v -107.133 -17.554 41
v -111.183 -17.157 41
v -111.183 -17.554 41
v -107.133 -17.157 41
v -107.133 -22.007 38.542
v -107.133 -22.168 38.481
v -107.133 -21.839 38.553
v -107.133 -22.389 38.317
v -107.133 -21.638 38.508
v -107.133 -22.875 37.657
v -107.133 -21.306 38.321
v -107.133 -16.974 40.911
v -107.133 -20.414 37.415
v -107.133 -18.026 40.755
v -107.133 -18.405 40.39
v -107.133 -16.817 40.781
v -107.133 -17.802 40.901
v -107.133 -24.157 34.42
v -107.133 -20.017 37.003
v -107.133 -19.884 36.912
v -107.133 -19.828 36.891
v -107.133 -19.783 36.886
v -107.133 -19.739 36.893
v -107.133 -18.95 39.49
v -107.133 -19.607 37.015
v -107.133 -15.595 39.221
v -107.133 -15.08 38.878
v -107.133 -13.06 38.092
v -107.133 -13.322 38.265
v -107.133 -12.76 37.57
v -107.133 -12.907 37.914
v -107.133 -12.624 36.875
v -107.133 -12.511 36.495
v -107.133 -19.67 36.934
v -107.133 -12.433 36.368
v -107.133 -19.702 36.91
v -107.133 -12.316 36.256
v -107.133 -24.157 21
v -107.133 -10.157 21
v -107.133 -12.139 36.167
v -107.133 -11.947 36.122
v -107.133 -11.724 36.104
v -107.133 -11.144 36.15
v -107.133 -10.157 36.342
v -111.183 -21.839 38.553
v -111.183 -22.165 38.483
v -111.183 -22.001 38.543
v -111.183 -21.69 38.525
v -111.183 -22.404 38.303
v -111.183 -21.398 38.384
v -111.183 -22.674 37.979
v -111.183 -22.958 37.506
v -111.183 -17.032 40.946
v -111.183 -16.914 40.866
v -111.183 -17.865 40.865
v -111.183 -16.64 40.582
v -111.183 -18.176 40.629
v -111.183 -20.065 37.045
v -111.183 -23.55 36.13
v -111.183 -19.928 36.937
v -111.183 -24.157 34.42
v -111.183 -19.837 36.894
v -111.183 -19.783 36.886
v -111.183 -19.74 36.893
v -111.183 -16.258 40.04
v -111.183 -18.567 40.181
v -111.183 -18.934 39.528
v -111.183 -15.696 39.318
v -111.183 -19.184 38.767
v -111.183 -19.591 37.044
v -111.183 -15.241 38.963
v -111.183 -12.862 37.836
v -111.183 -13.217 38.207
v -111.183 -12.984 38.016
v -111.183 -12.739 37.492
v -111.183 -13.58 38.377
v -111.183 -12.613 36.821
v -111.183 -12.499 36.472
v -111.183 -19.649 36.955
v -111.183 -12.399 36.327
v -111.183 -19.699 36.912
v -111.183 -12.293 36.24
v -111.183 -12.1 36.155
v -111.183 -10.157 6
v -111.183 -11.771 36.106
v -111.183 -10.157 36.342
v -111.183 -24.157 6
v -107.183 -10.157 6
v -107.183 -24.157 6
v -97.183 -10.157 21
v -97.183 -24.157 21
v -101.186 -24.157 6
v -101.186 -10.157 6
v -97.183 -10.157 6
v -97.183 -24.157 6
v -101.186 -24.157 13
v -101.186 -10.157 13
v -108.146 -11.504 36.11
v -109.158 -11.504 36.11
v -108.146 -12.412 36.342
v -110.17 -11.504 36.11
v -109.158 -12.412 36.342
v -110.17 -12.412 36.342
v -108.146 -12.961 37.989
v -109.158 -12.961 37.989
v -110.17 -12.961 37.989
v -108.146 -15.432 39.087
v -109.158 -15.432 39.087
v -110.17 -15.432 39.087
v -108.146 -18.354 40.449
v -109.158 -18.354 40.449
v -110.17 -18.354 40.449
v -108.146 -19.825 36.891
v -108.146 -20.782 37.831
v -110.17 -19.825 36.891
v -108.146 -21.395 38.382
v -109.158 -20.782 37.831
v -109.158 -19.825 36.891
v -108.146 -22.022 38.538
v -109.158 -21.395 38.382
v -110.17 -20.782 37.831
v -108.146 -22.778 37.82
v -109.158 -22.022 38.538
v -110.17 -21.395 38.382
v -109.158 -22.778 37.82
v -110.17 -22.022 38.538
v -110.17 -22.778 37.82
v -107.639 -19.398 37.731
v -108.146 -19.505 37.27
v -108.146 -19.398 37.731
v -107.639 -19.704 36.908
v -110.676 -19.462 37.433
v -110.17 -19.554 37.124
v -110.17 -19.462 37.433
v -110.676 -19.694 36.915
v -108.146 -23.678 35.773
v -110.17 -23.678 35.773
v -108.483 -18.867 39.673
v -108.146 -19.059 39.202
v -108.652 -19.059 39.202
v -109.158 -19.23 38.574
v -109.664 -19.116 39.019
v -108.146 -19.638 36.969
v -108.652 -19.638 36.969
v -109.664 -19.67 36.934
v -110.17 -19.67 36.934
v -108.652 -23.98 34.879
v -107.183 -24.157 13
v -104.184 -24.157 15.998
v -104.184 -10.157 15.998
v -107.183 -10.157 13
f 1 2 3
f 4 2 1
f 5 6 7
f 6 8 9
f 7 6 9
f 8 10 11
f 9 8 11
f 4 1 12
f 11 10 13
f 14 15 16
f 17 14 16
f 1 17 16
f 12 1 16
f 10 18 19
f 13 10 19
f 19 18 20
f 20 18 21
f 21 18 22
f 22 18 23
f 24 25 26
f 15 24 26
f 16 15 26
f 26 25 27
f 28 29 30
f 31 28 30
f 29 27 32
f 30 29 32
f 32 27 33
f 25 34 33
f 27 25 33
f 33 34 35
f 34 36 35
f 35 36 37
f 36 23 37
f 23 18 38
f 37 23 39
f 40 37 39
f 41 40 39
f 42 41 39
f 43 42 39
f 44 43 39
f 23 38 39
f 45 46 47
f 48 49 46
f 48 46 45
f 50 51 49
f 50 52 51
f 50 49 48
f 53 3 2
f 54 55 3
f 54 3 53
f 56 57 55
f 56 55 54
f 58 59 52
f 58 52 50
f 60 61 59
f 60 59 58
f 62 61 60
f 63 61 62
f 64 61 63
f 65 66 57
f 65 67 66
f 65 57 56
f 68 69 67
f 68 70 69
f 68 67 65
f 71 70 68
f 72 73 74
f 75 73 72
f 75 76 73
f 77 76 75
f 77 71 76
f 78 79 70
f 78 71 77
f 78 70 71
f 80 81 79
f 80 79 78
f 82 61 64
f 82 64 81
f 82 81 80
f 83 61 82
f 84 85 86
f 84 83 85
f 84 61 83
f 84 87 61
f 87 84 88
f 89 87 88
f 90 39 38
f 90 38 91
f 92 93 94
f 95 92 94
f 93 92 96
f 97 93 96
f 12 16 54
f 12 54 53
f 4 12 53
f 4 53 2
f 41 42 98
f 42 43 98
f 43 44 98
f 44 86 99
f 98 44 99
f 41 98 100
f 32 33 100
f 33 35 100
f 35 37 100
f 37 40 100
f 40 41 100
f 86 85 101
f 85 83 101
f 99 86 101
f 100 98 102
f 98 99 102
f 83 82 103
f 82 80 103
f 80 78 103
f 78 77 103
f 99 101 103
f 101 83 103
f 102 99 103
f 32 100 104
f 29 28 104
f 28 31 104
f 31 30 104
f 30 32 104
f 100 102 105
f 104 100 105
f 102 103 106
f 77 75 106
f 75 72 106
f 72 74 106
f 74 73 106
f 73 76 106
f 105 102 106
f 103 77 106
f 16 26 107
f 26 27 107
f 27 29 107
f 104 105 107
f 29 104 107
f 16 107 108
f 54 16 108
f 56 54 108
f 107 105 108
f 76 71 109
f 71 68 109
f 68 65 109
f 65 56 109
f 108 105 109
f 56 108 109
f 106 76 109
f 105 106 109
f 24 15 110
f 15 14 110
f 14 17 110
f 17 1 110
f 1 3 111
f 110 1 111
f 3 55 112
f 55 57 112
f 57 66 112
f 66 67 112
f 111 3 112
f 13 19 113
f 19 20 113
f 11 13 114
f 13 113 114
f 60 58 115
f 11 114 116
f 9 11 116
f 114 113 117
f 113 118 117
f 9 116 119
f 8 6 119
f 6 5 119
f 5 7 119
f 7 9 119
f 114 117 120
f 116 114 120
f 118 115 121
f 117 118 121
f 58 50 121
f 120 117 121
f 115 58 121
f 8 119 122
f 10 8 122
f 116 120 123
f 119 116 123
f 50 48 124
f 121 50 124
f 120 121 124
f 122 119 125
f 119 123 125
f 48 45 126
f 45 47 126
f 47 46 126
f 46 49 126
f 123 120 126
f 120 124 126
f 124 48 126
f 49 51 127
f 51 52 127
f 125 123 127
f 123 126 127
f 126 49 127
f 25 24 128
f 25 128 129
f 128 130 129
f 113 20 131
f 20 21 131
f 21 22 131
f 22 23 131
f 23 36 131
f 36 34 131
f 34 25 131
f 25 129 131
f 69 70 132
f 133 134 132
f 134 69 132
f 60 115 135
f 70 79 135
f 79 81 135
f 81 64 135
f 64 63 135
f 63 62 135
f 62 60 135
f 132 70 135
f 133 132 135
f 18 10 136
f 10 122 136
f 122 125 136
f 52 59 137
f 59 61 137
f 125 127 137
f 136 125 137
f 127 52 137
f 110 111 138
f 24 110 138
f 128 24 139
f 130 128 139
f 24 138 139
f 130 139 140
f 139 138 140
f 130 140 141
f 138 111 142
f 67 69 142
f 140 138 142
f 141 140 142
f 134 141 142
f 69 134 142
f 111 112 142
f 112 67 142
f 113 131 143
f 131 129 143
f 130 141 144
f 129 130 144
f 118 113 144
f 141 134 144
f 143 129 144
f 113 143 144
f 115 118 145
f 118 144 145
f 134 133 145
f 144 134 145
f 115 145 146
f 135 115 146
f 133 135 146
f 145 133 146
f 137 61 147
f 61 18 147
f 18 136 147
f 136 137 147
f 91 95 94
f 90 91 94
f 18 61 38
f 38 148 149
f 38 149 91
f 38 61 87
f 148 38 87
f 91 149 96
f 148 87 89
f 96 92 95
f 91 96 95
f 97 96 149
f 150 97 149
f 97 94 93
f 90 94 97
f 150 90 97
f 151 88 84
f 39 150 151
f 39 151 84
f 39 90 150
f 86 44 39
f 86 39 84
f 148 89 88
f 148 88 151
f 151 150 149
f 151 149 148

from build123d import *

# Parameters (mm, degrees)
F1_W        = 14
F1_H        = 14
F2_DEPTH    = 15
F3_W        = 4.0493770838
F3_H        = 14
F4_DEPTH    = 20
F6_DEPTH    = 25
F7_W        = 5.9968179464
F7_H        = 10
F8_DEPTH    = 25
F9_T1_DEPTH = 14


# Not quite as in the source:
# - a fillet or chamfer that OpenCascade refuses, or shapes differently, is made with other operations: its cross-section is extruded or revolved along the edge and cut away or added


with BuildPart() as f2:
    # F1 (on offset) → F2 (new body)
    with BuildSketch(Plane.XY.offset(6)):
        with Locations((-104.1826612949, -17.1571627557)):
            Rectangle(F1_W, F1_H)
    extrude(amount=F2_DEPTH)

    # F3 (on face) → F4 (join)
    with BuildSketch(Plane.XY.offset(21)):
        with Locations((-109.157972753, -17.1571627557)):
            Rectangle(F3_W, F3_H)
    extrude(amount=F4_DEPTH)

    # F5 (on face) → F6 (cut)
    with BuildSketch(Plane(origin=(-111.1826612949, 0, 0), x_dir=(0, -1, 0), z_dir=(-1, 0, 0))):
        with BuildLine():
            Line((10.1571627557, 41), (10.1571627557, 36.341752857))
            add(Edge.make_bspline(
                [(10.1571627557, 36.341752857), (11.1036728702, 36.1359380459), (12.8808040357, 35.7495080338), (12.4312722311, 38.5838720764), (15.8432736879, 38.466470991), (16.5506011139, 40.811261571), (17.1571627557, 41)],
                knots=[0, 0, 0, 0, 0.1074764373, 0.2017936453, 0.3194916252, 0.4343555632, 0.4343555632, 0.4343555632, 0.4343555632], degree=3))
            Line((17.1571627557, 41), (10.1571627557, 41))
        make_face()
        with BuildLine():
            add(Edge.make_bspline(
                [(17.1571627557, 41), (17.2807406542, 41.0384526432), (17.4149947295, 41.0366686909), (17.5538311602, 41)],
                knots=[0.4343555632, 0.4343555632, 0.4343555632, 0.4343555632, 0.4577573794, 0.4577573794, 0.4577573794, 0.4577573794], degree=3))
            Line((17.1571627557, 41), (17.5538311602, 41))
        make_face()
        with BuildLine():
            Line((24.1571627557, 41), (17.5538311602, 41))
            add(Edge.make_bspline(
                [(17.5538311602, 41), (18.0819152443, 40.860525426), (19.4476463077, 39.3803759727), (19.3611823544, 35.2887382601), (22.4135127849, 41.0203121515), (23.9648709709, 34.6951006825), (24.1571627557, 34.419786185)],
                knots=[0.4577573794, 0.4577573794, 0.4577573794, 0.4577573794, 0.5467695113, 0.6622841032, 0.7808817799, 0.9350414154, 0.9350414154, 0.9350414154, 0.9350414154], degree=3))
            Line((24.1571627557, 34.419786185), (24.1571627557, 35.2434851229))
            Line((24.1571627557, 35.2434851229), (24.1571627557, 41))
        make_face()
    extrude(amount=-F6_DEPTH, mode=Mode.SUBTRACT)

    # F7 (on face) → F8 (cut)
    with BuildSketch(Plane.XZ.offset(24.1571627557)):
        with Locations((-104.1842523217, 11)):
            Rectangle(F7_W, F7_H)
    extrude(amount=-F8_DEPTH, mode=Mode.SUBTRACT)

    # F9: chamfer of 3 on 2 edges, made by hand

    # F9_s2 → F9_t1 (join)
    with BuildSketch(Plane.XZ.offset(10.1571627557)):
        with BuildLine():
            Line((-104.0978084812, 16.0848528137), (-107.2675141087, 12.9151471863))
            Line((-107.2675141087, 12.9151471863), (-107.3275141087, 12.9151471863))
            ThreePointArc((-107.3275141087, 12.9151471863), (-107.2426612949, 14.4575735931), (-107.2426612949, 16))
            Line((-107.2426612949, 16), (-107.1826612949, 16.06))
            ThreePointArc((-107.1826612949, 16.06), (-105.6402348881, 16.06), (-104.0978084812, 16.1448528137))
            Line((-104.0978084812, 16.1448528137), (-104.0978084812, 16.0848528137))
        make_face()
        with BuildLine():
            Line((-101.1009905348, 12.9151471863), (-104.2706961622, 16.0848528137))
            Line((-104.2706961622, 16.0848528137), (-104.2706961622, 16.1448528137))
            ThreePointArc((-104.2706961622, 16.1448528137), (-102.7282697554, 16.06), (-101.1858433485, 16.06))
            Line((-101.1858433485, 16.06), (-101.1258433485, 16))
            ThreePointArc((-101.1258433485, 16), (-101.1258433485, 14.4575735931), (-101.0409905348, 12.9151471863))
            Line((-101.0409905348, 12.9151471863), (-101.1009905348, 12.9151471863))
        make_face()
    extrude(amount=F9_T1_DEPTH)


solid = f2.part
